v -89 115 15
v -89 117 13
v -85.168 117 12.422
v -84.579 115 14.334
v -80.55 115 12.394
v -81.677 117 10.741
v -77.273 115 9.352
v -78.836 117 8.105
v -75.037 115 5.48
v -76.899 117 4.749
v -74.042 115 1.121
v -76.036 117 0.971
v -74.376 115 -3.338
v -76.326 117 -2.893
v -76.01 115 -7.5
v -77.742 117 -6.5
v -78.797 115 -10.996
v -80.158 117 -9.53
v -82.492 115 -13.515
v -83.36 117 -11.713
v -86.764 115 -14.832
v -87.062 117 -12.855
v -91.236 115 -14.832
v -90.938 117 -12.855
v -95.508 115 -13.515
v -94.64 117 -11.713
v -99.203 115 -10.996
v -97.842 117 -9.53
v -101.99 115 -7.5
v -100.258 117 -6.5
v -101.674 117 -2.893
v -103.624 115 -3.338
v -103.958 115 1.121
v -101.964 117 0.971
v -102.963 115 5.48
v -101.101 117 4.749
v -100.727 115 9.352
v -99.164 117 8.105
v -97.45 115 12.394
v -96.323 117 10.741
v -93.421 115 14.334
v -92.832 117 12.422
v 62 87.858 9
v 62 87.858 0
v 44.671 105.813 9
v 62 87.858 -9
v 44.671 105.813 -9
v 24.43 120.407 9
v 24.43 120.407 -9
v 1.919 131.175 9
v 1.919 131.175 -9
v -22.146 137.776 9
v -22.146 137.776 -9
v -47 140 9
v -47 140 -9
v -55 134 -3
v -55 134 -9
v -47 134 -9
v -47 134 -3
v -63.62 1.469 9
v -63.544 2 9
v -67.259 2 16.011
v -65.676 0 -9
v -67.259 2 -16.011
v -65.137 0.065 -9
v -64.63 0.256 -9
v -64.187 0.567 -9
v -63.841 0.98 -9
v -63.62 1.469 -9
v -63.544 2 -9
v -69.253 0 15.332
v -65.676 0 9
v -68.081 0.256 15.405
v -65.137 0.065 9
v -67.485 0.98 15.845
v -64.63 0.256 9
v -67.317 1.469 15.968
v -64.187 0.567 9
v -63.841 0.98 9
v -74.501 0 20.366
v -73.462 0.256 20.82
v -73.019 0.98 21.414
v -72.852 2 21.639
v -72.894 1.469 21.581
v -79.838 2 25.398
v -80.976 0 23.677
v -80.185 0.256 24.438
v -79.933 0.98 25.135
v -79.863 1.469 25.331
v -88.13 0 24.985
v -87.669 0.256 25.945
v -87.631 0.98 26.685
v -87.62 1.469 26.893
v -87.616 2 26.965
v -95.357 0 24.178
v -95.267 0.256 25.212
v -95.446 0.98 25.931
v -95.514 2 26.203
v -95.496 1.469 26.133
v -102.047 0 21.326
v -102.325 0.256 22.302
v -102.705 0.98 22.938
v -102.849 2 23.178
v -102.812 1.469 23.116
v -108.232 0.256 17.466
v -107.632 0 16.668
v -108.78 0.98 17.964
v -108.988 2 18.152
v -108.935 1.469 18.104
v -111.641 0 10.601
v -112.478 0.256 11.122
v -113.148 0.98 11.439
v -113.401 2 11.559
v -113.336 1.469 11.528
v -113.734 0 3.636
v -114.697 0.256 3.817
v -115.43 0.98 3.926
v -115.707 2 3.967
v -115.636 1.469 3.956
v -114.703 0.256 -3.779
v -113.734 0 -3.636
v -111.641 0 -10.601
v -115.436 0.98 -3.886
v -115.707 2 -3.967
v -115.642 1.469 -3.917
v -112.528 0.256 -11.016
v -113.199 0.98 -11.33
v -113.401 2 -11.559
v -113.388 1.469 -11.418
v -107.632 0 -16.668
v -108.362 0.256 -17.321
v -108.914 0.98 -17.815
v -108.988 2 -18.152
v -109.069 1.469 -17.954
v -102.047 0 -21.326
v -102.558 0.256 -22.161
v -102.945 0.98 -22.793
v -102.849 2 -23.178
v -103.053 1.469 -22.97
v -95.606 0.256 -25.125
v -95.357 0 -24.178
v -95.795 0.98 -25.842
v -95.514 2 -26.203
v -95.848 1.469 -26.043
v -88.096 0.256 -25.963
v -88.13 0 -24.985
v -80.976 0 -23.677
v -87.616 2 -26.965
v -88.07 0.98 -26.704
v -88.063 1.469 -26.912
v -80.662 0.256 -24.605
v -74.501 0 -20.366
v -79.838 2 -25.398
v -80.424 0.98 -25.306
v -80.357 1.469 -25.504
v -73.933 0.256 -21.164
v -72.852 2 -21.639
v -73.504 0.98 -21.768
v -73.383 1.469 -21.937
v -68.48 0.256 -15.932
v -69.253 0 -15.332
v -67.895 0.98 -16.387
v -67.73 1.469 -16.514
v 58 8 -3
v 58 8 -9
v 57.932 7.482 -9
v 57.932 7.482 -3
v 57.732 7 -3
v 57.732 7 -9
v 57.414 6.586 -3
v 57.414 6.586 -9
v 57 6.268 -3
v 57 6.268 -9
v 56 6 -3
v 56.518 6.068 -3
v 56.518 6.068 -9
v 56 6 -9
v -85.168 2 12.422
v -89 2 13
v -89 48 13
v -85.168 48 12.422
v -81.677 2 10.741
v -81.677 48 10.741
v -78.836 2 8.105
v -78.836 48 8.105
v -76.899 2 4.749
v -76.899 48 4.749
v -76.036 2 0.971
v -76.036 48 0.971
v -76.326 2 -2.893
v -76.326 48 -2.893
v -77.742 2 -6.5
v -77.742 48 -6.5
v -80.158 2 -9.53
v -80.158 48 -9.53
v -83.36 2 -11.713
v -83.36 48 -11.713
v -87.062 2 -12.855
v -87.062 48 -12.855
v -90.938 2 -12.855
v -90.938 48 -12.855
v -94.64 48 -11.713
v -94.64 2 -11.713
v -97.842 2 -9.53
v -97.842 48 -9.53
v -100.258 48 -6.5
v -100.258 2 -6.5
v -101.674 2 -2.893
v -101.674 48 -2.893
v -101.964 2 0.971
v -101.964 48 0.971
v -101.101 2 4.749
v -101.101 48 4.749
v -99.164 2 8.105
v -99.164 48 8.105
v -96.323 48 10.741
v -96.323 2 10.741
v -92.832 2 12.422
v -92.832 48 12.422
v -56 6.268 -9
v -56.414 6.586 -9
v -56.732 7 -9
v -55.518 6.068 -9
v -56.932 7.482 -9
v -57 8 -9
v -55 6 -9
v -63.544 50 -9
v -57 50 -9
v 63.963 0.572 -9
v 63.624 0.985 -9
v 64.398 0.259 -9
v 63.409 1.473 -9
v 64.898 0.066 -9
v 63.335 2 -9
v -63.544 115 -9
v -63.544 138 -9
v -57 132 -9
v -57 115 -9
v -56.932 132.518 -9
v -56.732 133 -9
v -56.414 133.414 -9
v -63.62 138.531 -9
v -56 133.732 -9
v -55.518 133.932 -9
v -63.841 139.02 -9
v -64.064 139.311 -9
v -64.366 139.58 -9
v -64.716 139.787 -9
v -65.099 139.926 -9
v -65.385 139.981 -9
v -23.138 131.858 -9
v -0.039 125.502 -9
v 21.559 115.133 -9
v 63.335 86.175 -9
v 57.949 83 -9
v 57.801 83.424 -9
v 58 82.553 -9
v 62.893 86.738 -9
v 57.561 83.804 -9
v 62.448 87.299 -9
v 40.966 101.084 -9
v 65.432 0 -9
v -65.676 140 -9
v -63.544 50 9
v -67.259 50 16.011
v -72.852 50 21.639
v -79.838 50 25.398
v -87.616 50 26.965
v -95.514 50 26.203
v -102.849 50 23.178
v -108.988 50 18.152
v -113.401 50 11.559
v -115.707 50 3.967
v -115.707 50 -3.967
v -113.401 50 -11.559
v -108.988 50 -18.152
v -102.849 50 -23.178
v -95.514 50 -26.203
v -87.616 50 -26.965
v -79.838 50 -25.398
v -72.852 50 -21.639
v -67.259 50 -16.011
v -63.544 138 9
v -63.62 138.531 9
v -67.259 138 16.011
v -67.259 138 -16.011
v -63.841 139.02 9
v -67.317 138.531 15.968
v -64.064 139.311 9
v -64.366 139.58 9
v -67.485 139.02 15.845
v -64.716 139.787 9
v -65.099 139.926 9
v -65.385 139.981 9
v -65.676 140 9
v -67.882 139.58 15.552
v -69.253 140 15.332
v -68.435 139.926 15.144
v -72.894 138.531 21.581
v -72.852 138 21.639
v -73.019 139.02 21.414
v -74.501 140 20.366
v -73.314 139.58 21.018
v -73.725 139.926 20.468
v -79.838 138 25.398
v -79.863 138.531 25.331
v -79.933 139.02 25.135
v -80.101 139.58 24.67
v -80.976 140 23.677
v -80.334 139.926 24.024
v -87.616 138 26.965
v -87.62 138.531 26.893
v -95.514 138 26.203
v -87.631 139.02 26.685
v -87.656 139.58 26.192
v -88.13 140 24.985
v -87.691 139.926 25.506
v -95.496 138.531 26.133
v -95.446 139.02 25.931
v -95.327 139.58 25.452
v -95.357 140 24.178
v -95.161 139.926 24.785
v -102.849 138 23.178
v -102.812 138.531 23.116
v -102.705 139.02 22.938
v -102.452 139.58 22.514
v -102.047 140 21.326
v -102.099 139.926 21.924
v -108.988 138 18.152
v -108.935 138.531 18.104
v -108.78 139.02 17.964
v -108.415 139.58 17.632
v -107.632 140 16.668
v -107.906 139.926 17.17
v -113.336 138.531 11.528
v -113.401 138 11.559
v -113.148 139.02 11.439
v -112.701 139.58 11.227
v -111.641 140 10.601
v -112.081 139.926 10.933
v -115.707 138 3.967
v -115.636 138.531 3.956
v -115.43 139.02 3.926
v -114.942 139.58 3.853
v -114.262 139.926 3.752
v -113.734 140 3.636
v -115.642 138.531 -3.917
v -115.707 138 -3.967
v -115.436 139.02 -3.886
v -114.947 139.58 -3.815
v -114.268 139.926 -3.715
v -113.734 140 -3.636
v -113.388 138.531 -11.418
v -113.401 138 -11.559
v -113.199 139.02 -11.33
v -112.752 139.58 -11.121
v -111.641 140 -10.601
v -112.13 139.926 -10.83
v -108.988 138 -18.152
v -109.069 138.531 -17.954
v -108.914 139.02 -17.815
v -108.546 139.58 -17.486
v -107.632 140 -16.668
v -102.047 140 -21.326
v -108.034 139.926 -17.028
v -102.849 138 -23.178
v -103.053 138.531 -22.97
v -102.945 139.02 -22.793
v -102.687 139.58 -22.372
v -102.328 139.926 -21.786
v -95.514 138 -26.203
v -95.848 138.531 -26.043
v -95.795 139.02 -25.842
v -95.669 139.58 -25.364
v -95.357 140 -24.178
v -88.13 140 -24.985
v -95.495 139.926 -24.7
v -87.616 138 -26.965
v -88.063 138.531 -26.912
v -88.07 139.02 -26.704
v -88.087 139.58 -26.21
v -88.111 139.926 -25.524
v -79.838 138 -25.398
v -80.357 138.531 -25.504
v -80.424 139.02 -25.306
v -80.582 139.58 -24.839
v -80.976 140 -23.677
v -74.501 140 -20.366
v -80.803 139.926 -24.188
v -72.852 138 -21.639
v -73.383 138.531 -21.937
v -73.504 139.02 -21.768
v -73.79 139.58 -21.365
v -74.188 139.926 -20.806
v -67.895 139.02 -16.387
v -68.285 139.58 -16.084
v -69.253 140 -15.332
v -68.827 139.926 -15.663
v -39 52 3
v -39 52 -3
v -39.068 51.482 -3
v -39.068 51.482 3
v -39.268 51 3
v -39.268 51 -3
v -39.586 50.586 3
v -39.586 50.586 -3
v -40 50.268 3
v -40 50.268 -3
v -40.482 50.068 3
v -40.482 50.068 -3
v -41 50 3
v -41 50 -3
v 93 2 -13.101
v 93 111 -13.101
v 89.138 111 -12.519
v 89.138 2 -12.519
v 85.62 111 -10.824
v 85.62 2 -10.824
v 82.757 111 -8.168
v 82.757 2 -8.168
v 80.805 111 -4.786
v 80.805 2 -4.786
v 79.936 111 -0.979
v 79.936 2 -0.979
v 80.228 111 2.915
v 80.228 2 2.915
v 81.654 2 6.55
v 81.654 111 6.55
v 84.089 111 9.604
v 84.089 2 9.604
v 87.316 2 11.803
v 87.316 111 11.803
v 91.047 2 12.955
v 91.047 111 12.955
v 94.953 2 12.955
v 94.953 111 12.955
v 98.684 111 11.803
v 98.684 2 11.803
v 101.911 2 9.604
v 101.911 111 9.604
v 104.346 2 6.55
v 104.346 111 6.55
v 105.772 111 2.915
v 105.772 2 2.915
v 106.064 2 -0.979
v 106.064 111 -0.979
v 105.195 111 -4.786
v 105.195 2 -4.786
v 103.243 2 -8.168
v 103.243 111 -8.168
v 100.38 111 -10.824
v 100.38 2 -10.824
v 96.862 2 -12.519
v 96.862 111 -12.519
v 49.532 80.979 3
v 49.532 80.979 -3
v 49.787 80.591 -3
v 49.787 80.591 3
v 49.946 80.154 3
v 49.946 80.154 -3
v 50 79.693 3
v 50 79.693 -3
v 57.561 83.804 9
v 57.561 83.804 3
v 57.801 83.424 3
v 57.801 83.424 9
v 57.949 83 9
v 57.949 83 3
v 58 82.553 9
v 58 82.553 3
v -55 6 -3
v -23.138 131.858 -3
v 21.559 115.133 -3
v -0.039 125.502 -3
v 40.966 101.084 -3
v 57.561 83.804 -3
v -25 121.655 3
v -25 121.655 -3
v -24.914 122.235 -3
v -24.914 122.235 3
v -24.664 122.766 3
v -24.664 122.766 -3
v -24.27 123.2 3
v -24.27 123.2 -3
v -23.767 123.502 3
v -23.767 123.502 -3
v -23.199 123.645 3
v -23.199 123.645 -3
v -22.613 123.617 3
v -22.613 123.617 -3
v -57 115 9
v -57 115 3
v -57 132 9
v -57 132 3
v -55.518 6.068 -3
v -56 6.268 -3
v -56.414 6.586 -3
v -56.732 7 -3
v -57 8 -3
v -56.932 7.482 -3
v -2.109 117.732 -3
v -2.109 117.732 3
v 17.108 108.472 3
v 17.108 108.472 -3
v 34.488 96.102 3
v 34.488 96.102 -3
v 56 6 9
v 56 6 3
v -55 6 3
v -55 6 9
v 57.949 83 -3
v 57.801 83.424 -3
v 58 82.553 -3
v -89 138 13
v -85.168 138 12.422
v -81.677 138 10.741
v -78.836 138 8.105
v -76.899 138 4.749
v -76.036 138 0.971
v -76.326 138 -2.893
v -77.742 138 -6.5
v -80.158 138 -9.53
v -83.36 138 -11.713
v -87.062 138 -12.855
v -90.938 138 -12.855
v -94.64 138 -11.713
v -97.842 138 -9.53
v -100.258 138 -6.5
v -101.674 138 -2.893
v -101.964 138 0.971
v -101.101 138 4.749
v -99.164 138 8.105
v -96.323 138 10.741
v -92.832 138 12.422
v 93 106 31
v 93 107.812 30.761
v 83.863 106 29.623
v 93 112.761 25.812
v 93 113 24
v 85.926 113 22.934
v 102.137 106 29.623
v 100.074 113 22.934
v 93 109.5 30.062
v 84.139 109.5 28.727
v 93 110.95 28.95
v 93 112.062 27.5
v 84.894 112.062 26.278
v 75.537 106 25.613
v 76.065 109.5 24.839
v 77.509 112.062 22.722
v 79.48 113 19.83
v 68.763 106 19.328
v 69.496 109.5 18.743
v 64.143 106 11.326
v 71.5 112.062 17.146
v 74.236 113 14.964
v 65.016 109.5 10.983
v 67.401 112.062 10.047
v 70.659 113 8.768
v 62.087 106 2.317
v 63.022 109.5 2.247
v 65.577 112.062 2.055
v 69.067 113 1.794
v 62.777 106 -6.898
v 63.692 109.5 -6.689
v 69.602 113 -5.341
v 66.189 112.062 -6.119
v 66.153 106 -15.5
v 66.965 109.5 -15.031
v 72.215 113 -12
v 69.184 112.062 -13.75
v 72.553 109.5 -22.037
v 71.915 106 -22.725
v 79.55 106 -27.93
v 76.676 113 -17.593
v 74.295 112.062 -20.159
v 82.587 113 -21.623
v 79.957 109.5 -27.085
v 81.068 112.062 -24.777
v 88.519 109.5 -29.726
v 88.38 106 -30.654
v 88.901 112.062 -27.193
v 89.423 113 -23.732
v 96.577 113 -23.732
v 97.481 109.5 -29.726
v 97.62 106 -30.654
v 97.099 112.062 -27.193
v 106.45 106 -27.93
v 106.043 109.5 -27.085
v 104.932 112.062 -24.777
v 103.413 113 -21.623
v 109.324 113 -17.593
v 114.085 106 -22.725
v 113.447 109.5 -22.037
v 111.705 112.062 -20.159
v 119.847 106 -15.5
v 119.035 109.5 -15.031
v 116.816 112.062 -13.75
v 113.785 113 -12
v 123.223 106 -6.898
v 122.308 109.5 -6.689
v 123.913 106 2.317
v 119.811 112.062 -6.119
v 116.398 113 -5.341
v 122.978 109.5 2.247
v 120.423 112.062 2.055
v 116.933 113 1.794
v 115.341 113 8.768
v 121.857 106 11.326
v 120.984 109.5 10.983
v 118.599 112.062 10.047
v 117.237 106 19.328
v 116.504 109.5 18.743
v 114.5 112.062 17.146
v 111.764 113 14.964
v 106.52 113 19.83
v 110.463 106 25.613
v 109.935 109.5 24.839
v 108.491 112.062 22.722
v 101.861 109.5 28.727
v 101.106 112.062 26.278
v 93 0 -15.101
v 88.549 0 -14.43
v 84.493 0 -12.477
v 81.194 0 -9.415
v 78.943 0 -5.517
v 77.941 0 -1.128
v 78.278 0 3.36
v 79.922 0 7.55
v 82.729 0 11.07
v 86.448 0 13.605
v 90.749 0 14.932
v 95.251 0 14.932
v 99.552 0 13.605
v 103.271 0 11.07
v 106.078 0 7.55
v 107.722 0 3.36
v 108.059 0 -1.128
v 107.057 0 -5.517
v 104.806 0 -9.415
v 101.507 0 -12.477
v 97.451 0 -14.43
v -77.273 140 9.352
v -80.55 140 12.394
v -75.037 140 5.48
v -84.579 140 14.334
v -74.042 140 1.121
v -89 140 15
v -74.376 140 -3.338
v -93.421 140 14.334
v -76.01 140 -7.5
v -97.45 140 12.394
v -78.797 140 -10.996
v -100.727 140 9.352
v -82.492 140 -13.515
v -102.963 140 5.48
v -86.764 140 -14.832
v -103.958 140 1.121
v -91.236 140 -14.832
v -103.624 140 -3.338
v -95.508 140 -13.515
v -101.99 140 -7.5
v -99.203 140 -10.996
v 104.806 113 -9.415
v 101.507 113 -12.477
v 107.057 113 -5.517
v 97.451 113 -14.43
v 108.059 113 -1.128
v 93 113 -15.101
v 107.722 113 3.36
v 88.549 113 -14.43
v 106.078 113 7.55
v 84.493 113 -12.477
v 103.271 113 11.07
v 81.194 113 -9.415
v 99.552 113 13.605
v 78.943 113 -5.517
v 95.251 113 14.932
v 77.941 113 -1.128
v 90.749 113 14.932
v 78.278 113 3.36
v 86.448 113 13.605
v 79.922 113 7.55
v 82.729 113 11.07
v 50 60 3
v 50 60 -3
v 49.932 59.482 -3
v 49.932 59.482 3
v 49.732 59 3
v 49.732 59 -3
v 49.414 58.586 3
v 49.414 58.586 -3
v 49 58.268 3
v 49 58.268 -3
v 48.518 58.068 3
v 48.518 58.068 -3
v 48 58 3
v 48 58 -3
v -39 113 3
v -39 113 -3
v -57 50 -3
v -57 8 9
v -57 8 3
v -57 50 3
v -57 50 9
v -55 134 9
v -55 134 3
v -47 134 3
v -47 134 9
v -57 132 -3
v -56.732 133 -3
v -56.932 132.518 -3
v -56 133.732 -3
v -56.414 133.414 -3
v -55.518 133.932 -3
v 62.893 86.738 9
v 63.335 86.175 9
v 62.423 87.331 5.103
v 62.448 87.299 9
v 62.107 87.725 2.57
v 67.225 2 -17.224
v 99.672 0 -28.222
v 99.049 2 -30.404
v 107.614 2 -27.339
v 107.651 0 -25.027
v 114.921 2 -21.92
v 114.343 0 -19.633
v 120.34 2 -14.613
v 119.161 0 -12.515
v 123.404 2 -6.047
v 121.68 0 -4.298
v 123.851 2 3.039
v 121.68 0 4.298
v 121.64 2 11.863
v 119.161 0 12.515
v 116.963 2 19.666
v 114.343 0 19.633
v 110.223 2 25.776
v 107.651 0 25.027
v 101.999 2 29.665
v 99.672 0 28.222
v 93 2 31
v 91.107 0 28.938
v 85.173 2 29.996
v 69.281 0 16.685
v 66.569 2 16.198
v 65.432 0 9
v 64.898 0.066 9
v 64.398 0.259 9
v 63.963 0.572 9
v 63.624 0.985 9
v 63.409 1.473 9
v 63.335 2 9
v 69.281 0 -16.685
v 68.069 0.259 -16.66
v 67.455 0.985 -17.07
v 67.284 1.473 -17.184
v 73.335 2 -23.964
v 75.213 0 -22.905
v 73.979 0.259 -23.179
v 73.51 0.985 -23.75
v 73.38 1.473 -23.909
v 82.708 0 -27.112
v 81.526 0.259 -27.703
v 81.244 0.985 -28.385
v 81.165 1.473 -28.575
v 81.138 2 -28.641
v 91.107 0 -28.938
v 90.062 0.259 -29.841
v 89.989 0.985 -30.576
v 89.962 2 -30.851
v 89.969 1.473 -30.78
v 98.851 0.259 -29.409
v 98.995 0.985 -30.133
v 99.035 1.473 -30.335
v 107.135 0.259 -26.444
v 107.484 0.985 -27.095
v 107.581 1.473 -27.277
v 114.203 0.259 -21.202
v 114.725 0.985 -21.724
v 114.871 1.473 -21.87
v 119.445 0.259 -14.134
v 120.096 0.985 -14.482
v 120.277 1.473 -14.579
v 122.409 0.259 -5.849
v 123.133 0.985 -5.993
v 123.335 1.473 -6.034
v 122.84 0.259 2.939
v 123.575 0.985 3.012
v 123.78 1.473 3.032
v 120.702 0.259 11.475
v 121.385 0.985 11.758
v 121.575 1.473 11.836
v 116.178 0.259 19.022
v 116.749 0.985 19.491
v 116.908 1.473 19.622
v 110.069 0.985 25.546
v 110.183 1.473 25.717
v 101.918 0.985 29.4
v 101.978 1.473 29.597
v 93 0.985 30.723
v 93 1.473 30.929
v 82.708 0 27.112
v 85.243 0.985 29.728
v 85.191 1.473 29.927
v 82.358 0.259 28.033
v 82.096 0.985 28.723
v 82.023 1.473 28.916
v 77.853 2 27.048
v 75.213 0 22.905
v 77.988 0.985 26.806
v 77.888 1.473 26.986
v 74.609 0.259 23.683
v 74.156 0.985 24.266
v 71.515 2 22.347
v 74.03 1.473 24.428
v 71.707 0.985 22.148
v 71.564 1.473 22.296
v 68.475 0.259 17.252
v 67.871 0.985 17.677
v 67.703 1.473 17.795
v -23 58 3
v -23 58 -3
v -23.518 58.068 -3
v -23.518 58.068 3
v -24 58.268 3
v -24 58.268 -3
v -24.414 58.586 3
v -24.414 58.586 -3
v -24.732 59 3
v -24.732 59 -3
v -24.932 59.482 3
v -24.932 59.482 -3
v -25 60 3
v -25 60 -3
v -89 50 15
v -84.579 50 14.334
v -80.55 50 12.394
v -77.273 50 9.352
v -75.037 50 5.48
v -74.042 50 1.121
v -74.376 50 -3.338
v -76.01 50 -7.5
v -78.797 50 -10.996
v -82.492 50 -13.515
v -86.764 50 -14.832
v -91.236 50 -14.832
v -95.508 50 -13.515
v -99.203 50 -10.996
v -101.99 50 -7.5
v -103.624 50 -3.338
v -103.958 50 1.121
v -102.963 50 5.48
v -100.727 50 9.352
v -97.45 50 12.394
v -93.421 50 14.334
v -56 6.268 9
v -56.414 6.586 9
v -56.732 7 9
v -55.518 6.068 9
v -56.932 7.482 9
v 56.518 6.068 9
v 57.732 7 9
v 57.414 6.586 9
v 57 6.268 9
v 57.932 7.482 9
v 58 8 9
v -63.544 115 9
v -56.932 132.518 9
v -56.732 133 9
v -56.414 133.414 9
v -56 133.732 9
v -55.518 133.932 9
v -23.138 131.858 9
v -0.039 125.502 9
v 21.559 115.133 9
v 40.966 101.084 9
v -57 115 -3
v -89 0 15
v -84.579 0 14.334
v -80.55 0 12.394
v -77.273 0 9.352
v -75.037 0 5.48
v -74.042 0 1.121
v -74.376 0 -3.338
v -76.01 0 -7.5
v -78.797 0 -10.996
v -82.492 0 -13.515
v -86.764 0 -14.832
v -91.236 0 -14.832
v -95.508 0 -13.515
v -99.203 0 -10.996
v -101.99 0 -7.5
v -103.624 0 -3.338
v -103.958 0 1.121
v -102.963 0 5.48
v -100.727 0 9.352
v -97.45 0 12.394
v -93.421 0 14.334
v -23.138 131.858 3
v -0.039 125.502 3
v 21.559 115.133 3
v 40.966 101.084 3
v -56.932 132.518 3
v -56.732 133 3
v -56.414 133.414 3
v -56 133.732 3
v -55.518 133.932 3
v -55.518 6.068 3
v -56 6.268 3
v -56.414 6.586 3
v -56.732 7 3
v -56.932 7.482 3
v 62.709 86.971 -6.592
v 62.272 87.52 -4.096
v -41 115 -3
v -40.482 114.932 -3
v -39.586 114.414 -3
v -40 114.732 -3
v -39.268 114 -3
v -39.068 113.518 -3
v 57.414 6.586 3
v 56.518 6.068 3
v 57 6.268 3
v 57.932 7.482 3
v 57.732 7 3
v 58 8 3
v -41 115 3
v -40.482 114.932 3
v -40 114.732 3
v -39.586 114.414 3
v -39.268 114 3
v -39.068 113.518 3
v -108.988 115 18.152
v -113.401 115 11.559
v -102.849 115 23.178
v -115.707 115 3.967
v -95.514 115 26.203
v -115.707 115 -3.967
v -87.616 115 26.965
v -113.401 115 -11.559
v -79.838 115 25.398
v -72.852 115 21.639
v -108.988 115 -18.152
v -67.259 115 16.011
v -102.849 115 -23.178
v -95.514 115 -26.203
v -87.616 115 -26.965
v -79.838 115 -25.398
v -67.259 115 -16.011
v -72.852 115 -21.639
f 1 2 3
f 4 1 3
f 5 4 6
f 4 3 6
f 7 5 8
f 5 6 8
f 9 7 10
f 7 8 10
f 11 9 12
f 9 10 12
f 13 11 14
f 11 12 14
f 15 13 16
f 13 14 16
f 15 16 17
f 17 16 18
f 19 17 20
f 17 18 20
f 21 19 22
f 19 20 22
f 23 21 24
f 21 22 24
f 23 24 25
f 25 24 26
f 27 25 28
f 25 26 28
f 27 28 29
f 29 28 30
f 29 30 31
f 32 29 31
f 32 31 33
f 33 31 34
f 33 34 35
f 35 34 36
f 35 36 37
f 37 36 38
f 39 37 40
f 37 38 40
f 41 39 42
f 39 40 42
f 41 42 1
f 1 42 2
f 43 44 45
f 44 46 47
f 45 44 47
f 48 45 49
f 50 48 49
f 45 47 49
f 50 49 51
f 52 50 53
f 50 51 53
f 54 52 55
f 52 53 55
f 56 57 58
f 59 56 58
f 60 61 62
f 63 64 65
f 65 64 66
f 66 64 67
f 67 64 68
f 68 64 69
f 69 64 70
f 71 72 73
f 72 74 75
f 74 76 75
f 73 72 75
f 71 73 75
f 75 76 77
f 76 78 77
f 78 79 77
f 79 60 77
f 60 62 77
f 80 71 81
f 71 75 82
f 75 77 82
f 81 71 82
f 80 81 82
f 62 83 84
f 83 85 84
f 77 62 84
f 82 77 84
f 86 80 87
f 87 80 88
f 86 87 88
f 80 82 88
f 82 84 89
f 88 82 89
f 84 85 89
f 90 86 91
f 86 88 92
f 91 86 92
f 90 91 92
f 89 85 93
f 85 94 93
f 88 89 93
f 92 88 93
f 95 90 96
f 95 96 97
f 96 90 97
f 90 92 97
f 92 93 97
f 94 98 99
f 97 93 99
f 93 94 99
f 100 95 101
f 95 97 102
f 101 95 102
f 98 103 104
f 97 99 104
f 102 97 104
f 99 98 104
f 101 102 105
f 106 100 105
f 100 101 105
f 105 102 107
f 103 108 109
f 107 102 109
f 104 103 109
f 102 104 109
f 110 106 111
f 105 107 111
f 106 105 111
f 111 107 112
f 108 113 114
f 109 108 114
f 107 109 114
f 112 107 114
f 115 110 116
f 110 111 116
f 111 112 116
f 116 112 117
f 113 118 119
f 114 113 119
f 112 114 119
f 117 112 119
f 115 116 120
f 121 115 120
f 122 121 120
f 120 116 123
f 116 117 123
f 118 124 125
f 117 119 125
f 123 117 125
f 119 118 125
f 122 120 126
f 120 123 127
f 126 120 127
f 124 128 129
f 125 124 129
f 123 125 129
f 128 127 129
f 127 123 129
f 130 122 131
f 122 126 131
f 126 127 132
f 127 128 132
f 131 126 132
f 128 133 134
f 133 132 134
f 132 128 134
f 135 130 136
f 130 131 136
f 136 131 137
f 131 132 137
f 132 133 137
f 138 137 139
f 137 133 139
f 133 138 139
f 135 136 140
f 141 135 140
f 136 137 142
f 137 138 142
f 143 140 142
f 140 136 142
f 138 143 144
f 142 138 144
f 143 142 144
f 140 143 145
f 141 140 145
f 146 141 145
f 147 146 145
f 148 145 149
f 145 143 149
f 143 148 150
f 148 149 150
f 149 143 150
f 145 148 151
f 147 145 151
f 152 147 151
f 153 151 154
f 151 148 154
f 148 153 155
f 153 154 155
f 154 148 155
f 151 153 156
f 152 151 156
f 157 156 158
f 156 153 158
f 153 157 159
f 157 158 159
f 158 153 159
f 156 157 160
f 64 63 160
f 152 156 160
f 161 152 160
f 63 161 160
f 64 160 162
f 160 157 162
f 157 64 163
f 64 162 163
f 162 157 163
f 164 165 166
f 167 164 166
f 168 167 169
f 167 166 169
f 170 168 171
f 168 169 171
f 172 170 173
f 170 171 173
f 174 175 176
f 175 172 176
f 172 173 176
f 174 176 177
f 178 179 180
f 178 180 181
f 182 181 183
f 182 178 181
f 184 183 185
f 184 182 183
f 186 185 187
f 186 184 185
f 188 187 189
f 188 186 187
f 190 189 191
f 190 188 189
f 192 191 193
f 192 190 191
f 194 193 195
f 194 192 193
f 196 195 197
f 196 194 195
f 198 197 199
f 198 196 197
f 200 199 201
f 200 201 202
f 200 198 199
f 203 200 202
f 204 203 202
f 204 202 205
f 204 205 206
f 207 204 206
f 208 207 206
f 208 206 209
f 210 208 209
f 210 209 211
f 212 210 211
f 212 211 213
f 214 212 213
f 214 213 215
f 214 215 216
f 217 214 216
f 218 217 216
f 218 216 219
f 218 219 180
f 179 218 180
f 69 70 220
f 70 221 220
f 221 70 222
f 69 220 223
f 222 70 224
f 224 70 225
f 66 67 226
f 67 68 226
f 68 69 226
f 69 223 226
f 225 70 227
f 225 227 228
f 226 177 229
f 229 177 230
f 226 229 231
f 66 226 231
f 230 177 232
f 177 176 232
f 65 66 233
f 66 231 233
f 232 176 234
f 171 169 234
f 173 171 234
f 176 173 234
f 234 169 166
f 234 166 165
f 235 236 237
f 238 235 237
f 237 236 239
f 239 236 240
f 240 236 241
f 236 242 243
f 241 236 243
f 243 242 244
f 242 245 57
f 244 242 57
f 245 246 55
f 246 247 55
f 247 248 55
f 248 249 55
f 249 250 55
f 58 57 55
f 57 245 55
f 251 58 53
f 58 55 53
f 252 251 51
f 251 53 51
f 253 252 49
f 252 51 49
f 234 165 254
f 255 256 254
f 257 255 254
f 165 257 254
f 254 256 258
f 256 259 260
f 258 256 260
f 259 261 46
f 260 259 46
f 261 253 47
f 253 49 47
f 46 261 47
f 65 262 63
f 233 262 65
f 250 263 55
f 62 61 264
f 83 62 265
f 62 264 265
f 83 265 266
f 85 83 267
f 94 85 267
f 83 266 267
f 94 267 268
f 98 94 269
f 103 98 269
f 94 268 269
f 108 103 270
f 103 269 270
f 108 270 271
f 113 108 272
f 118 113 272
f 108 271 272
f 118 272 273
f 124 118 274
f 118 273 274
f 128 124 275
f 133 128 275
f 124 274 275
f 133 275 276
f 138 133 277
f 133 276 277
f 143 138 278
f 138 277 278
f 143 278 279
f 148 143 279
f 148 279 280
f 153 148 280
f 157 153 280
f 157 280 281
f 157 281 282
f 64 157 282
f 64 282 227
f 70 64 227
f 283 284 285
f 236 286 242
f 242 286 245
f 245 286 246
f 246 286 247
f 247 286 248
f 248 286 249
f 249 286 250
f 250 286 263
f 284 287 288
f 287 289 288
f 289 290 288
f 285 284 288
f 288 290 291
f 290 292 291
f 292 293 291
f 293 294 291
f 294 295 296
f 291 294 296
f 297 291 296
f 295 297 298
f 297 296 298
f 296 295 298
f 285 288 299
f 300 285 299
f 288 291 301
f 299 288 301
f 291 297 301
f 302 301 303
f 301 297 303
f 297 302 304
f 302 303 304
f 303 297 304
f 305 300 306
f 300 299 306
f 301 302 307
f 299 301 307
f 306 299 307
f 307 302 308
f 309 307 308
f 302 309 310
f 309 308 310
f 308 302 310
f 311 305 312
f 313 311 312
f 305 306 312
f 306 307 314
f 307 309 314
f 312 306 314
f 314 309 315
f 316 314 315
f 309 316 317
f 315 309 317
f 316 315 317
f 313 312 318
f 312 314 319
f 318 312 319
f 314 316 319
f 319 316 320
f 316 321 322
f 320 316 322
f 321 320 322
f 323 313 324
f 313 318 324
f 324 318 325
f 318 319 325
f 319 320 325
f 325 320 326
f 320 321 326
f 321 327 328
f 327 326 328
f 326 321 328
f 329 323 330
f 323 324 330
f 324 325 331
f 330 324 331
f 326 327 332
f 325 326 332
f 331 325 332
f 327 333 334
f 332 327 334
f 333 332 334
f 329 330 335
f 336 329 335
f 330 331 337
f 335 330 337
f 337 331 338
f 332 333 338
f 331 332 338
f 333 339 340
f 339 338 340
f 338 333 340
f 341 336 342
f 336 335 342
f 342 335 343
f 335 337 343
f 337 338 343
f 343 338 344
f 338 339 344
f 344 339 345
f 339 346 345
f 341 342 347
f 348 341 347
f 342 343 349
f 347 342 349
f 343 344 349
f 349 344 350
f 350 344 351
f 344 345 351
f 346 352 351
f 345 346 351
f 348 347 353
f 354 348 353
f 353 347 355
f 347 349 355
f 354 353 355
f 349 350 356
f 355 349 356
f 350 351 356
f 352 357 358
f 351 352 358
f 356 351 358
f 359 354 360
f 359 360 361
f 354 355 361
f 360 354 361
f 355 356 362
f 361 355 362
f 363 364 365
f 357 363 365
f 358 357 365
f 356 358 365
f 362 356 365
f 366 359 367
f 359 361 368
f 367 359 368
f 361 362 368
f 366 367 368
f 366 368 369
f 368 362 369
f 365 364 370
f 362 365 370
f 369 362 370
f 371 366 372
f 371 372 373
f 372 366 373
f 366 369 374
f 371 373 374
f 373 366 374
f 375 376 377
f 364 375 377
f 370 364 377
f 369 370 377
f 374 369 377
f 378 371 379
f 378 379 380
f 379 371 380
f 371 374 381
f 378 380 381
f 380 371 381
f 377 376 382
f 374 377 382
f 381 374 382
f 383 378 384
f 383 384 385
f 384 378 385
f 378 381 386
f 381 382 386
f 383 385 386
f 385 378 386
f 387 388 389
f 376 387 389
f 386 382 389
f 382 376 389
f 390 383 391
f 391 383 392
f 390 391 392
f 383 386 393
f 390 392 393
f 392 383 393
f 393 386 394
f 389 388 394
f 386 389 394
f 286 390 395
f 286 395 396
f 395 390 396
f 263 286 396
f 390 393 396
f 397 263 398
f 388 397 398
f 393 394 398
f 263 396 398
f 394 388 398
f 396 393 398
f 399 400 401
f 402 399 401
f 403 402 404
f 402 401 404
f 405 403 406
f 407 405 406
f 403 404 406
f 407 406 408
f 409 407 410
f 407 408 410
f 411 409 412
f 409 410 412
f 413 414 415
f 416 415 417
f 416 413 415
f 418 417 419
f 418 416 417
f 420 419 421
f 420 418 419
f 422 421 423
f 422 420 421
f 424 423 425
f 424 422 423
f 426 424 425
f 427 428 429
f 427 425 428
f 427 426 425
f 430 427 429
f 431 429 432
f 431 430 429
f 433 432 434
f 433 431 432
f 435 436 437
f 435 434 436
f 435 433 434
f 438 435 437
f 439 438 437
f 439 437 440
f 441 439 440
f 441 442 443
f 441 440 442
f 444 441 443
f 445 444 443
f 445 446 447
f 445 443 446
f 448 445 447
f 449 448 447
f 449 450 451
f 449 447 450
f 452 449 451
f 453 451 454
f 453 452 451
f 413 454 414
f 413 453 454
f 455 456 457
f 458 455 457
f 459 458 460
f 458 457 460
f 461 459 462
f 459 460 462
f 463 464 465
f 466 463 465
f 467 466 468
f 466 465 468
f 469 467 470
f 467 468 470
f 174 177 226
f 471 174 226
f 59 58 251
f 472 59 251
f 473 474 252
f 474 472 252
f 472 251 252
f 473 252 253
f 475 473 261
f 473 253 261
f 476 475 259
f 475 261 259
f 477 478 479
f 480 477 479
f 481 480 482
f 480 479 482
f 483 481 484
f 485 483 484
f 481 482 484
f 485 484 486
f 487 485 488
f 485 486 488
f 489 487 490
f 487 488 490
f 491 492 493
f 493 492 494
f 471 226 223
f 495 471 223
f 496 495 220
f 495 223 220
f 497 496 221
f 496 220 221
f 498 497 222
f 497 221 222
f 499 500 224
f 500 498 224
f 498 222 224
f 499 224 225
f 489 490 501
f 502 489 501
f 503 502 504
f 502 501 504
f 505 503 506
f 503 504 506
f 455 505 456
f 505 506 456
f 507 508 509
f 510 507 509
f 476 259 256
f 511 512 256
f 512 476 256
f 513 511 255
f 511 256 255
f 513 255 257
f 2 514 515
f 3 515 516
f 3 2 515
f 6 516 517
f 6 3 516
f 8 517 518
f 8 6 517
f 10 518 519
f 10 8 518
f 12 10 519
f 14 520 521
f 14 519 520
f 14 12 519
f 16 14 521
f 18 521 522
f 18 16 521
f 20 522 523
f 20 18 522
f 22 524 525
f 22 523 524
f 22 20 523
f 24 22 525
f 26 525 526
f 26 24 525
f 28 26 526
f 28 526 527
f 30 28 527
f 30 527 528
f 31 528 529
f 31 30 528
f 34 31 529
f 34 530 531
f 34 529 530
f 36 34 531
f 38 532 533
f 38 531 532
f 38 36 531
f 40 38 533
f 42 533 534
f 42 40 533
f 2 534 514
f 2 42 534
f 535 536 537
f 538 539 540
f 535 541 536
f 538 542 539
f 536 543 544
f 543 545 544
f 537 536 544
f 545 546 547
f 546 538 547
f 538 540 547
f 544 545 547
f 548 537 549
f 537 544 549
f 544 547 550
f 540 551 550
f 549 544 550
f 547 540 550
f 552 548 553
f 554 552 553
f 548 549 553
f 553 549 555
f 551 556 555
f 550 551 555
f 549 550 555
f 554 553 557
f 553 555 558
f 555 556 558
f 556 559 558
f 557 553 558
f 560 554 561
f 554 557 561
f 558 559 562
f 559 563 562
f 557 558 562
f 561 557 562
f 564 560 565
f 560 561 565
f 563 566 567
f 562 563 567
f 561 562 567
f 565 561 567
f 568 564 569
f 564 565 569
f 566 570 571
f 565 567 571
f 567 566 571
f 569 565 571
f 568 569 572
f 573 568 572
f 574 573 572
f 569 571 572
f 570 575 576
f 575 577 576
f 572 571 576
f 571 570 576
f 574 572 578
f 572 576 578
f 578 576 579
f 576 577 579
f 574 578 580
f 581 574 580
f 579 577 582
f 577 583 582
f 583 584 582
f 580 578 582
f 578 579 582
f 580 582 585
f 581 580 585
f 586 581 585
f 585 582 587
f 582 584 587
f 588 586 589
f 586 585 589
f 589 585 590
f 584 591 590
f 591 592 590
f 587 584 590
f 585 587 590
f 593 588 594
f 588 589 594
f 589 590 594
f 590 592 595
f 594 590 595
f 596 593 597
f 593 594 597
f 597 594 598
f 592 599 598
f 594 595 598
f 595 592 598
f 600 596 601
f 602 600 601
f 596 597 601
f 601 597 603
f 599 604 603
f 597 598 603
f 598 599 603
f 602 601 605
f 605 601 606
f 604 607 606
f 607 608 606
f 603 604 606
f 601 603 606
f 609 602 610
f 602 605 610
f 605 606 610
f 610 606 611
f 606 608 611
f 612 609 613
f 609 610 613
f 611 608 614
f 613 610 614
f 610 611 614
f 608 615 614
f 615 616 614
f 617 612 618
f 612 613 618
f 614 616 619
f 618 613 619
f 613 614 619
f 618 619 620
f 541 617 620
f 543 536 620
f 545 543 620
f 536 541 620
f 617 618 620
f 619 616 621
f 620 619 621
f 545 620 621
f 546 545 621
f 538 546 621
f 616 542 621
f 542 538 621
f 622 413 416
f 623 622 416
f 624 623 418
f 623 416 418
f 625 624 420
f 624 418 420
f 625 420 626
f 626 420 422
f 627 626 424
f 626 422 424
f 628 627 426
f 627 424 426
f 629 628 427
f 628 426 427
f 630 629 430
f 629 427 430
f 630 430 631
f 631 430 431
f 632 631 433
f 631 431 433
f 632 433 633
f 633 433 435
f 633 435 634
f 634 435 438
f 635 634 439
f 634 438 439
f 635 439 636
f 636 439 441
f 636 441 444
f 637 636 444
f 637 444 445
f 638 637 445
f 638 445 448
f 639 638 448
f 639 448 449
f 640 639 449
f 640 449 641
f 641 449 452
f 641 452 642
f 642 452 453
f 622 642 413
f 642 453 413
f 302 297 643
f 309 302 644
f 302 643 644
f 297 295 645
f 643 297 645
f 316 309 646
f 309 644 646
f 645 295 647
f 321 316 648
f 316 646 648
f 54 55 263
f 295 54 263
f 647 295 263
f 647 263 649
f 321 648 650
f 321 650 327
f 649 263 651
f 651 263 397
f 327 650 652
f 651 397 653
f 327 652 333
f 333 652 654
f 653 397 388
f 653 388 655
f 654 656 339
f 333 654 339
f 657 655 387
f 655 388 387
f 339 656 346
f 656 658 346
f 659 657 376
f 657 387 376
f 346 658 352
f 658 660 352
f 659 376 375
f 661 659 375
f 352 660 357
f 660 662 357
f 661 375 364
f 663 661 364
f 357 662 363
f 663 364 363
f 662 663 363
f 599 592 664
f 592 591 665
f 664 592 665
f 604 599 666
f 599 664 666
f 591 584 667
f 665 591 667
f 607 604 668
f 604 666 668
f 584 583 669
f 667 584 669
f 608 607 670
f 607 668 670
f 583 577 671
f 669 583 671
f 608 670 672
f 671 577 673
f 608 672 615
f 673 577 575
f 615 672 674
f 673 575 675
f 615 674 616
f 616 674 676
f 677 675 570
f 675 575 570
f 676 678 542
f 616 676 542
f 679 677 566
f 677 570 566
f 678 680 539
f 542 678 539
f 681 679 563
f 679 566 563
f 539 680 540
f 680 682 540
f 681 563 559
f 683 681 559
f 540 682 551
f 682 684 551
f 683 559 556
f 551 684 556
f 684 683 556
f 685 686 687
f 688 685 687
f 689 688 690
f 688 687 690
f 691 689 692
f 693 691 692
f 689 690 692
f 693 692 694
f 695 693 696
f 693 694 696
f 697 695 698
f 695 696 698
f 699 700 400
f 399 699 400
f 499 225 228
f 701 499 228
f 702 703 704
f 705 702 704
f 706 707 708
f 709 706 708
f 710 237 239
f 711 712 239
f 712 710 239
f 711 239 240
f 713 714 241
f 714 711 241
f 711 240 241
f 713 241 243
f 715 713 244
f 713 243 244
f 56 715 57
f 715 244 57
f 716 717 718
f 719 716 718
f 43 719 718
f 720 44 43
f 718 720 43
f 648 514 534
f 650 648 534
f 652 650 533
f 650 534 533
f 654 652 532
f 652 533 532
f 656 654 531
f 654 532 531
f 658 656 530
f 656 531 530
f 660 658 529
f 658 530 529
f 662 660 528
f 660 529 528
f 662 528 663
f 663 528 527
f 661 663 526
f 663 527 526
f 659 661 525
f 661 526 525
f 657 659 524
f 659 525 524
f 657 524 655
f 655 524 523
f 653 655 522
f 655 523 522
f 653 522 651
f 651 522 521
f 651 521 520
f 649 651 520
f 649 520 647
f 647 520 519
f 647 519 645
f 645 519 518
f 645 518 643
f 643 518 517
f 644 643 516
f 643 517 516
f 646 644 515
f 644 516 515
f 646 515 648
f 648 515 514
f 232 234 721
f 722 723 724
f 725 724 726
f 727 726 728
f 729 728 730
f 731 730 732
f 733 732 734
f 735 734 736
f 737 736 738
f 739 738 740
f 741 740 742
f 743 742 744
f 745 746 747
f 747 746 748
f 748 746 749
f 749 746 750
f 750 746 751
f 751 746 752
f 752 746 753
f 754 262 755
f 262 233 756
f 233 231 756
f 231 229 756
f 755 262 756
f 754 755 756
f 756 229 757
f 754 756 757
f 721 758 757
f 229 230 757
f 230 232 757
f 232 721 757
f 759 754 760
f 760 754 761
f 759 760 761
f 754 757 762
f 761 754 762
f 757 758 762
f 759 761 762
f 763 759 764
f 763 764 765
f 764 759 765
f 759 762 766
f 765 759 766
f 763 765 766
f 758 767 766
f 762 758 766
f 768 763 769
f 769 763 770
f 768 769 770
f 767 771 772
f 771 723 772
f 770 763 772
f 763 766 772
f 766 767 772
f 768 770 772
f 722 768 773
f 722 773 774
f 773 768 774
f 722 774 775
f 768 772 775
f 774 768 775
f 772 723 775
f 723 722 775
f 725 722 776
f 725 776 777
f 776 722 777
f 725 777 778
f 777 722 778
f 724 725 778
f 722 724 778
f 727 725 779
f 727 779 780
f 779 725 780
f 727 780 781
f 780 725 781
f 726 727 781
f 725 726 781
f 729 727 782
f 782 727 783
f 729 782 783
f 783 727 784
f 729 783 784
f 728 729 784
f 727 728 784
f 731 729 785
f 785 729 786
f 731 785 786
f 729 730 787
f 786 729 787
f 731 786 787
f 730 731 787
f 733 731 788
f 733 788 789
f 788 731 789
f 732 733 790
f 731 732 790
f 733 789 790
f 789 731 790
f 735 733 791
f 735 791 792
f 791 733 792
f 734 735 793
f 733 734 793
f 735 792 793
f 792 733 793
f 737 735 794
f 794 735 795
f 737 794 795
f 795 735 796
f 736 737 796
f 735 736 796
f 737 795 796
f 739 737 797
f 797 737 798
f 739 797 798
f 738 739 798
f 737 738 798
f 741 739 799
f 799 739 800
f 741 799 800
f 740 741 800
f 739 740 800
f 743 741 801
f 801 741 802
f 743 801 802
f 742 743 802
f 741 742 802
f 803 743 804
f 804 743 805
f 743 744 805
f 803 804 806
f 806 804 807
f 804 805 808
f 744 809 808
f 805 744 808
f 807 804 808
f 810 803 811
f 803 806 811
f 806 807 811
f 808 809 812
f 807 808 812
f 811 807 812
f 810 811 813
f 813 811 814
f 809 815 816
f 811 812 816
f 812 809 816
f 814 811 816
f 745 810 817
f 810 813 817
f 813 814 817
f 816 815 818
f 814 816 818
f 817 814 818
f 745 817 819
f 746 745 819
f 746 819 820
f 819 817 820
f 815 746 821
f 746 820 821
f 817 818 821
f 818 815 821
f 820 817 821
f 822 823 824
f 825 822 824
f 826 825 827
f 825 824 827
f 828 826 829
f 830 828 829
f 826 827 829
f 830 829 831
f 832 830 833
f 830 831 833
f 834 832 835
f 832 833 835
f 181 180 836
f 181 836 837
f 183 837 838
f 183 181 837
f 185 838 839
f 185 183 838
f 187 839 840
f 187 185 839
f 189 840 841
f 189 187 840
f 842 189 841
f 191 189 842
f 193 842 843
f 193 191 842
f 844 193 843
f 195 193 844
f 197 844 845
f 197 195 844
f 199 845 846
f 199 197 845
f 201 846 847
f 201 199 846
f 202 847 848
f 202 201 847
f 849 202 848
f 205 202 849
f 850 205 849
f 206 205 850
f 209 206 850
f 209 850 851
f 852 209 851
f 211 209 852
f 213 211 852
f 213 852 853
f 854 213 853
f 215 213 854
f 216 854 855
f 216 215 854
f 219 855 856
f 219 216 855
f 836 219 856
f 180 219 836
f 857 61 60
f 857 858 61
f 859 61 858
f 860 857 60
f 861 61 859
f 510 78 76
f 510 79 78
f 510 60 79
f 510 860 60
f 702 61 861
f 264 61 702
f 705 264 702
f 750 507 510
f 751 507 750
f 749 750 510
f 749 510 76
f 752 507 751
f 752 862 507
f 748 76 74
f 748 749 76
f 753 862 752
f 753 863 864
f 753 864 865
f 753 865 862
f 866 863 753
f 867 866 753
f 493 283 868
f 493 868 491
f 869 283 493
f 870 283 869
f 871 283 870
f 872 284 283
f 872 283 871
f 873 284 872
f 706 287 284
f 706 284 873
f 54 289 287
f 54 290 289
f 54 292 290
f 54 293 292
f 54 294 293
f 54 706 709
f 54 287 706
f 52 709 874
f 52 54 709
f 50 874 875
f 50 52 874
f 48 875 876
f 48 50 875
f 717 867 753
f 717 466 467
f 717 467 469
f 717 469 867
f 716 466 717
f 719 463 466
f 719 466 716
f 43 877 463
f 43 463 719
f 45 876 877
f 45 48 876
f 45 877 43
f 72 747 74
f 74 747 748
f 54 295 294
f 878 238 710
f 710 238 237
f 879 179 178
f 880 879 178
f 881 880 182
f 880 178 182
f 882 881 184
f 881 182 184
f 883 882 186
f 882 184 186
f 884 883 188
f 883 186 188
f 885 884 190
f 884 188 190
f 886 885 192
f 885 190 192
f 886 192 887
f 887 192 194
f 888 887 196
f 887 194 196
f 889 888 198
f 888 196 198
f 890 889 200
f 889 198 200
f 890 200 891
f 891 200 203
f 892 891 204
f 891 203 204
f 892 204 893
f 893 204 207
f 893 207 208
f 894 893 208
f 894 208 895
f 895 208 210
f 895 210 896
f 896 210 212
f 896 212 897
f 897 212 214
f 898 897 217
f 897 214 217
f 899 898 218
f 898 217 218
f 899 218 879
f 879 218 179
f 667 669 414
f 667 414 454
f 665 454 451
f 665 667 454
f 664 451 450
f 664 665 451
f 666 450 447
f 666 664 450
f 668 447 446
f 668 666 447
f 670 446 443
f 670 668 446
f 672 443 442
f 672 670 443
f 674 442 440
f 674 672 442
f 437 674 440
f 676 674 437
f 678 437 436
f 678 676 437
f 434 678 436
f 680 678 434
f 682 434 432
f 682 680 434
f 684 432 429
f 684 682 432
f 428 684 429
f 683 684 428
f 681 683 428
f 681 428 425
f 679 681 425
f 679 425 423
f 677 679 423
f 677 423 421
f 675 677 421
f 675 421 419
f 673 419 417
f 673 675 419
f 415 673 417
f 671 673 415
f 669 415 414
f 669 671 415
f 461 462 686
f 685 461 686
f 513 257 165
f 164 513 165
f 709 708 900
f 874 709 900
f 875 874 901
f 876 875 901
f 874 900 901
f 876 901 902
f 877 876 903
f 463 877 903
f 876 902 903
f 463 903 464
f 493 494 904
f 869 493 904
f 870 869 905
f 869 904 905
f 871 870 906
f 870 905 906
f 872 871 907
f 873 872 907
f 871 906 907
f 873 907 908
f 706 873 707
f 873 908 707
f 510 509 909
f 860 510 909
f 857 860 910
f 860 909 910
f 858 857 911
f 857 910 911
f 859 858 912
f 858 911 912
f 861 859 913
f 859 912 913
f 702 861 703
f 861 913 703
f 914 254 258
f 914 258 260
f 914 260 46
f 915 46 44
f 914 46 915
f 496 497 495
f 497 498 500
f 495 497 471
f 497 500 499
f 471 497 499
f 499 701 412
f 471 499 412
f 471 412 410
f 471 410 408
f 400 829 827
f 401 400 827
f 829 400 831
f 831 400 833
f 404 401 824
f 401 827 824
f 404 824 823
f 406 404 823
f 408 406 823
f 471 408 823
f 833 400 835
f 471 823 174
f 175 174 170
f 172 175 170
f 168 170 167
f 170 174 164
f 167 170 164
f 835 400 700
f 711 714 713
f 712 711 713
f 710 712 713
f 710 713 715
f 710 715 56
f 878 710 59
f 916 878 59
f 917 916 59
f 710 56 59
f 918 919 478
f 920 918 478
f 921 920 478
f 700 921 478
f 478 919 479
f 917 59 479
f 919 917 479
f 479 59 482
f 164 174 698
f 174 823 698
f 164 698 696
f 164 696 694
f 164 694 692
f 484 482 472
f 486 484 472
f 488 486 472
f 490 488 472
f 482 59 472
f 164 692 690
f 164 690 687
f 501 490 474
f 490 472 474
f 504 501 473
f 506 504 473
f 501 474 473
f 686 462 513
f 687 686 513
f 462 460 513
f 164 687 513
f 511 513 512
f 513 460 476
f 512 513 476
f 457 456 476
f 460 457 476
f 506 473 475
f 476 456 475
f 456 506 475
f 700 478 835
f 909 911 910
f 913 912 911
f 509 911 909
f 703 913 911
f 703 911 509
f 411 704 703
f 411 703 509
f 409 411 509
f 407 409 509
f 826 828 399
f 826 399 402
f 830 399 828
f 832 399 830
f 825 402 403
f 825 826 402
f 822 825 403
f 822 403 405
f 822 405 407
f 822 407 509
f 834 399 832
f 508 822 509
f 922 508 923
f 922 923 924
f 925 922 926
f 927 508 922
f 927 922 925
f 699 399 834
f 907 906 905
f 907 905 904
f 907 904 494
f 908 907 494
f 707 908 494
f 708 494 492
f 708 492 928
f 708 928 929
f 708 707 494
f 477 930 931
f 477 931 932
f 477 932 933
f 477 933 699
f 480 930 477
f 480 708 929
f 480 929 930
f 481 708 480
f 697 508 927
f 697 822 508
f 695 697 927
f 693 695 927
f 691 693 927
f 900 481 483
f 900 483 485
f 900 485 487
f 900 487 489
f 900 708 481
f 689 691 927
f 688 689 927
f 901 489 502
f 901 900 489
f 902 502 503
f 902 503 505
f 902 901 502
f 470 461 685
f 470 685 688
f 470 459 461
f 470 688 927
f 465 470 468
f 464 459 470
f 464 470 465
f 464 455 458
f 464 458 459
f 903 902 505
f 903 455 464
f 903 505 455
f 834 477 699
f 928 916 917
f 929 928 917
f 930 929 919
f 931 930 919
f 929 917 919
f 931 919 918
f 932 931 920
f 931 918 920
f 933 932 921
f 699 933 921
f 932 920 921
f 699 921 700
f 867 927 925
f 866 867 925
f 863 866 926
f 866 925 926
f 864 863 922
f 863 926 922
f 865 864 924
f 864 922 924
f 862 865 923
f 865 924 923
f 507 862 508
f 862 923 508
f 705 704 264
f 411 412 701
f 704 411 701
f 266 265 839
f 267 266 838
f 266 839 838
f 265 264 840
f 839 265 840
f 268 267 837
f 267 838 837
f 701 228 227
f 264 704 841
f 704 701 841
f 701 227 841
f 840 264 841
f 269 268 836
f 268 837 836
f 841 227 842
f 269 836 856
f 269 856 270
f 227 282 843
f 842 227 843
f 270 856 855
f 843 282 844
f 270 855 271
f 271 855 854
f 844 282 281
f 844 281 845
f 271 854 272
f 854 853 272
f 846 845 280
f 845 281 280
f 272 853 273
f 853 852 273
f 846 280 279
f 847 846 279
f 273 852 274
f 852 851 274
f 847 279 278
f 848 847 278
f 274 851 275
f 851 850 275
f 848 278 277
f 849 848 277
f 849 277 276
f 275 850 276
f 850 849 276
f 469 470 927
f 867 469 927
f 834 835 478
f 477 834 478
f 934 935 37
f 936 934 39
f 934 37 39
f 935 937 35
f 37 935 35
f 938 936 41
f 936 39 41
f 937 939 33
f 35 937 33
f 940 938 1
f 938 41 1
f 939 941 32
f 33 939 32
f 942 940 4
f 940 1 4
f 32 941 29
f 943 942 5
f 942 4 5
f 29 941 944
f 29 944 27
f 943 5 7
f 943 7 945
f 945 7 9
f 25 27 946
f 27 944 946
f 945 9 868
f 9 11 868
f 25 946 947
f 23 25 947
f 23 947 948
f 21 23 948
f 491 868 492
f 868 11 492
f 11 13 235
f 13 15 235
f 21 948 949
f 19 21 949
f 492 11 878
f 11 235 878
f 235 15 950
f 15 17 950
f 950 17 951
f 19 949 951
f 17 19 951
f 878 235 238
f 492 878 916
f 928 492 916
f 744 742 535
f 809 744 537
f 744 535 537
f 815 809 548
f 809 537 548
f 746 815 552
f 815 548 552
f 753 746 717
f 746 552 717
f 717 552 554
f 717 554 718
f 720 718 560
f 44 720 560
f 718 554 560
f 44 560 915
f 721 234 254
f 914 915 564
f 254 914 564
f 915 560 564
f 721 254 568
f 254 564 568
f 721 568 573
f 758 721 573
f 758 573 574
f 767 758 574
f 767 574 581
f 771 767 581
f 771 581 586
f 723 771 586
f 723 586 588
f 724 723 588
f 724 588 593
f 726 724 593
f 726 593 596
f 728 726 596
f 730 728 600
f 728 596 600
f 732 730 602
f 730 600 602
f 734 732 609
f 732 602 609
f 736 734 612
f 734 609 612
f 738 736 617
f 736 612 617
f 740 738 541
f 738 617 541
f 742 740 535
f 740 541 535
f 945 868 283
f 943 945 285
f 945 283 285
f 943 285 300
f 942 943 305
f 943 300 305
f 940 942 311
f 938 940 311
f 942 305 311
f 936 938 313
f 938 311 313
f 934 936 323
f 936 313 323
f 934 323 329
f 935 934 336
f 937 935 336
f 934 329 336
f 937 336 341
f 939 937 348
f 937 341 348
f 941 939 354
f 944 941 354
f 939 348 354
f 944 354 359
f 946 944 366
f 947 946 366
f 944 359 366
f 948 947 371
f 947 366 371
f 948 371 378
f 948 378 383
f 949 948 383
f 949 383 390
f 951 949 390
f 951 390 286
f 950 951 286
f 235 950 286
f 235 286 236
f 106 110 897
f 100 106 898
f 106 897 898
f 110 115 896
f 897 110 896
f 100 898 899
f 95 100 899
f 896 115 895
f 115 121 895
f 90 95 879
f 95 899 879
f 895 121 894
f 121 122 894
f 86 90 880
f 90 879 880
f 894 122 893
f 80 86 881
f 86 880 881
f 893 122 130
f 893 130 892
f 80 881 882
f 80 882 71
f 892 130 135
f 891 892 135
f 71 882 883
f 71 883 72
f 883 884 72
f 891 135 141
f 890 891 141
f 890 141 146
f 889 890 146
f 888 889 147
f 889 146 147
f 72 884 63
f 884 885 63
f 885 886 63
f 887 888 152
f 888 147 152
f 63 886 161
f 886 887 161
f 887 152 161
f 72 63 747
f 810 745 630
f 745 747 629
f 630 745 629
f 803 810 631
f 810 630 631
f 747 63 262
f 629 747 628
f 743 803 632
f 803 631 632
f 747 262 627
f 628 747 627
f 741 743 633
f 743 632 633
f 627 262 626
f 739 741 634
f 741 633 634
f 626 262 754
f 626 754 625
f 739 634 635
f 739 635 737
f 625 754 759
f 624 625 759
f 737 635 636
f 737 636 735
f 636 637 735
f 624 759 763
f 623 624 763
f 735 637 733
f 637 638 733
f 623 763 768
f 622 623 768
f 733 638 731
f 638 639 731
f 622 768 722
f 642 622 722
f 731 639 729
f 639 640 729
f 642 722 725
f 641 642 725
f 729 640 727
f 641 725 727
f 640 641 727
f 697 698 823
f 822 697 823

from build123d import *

# Parameters (mm, degrees)
CUT_EXTRUDE_8_DEPTH      = 184.806963974
EXTRUDE_1_DEPTH          = 9
EXTRUDE_1_DEPTH_BACK     = 9
EXTRUDE_2_DEPTH          = 3
EXTRUDE_2_DEPTH_BACK     = 3
SKETCH_2_R               = 13
SKETCH_2_R_2             = 13.100880905
CUT_EXTRUDE_7_DEPTH      = 190.570567491
CUT_EXTRUDE_9_DEPTH      = 190.570567491
CUT_EXTRUDE_9_DEPTH_BACK = 190.570567491
CHAMFER_4_SIZE           = 2
CHAMFER_5_SIZE           = 2
CHAMFER_6_SIZE           = 2


with BuildPart() as part:
    # Эскиз1 → Повернуть1 (revolve)
    with BuildSketch(Plane.XY, mode=Mode.PRIVATE) as revolve_1_sk:
        with BuildLine():
            Line((-62, 2), (-62, 138))
            ThreePointArc((-62, 138), (-62.585786438, 139.414213562), (-64, 140))
            Line((-64, 140), (-89, 140))
            Line((-89, 140), (-89, 0))
            Line((-89, 0), (-64, 0))
            ThreePointArc((-64, 0), (-62.585786438, 0.585786438), (-62, 2))
        make_face()
    revolve(revolve_1_sk.sketch.rotate(Axis((-89, 140, 0), (0, -1, 0)), 180), axis=Axis((-89, 140, 0), (0, -1, 0)))

    # Эскиз5 → Вырез-Вытянуть8 (cut, through all)
    with BuildSketch(Plane.XY):
        with BuildLine():
            Line((-116, 115), (-41, 115))
            ThreePointArc((-41, 115), (-39.585786438, 114.414213562), (-39, 113))
            Line((-39, 113), (-39, 52))
            ThreePointArc((-39, 52), (-39.585786438, 50.585786438), (-41, 50))
            Line((-41, 50), (-116, 50))
            Line((-116, 50), (-116, 115))
        make_face()
        with BuildLine():
            Line((50, 79.693161564), (50, 60))
            ThreePointArc((50, 60), (49.414213562, 58.585786438), (48, 58))
            Line((48, 58), (-23, 58))
            ThreePointArc((-23, 58), (-24.414213562, 58.585786438), (-25, 60))
            Line((-25, 60), (-25, 121.655250606))
            ThreePointArc((-25, 121.655250606), (-24.27000127, 123.200273834), (-22.612903226, 123.617432067))
            ThreePointArc((-22.612903226, 123.617432067), (17.108435299, 108.471694573), (49.532258065, 80.978535137))
            ThreePointArc((49.532258065, 80.978535137), (49.87943025, 80.377078178), (50, 79.693161564))
        make_face()
    extrude(amount=-CUT_EXTRUDE_8_DEPTH, mode=Mode.SUBTRACT)



with BuildPart() as body_2:
    # Эскиз1<4> → Повернуть2 (revolve)
    with BuildSketch(Plane.XY, mode=Mode.PRIVATE) as revolve_2_sk:
        with BuildLine():
            Line((62, 2), (62, 106))
            ThreePointArc((62, 106), (64.050252532, 110.949747468), (69, 113))
            Line((69, 113), (93, 113))
            Line((93, 113), (93, 0))
            Line((93, 0), (64, 0))
            ThreePointArc((64, 0), (62.585786438, 0.585786438), (62, 2))
        make_face()
    revolve(revolve_2_sk.sketch.rotate(Axis((93, 113, 0), (0, -1, 0)), 270), axis=Axis((93, 113, 0), (0, -1, 0)))


with BuildPart() as part_1:
    add(part.part)

    add(body_2.part)  # Бобышка-Вытянуть1 merges body 2
    # Эскиз1<5> → Бобышка-Вытянуть1 (add, two sides: drawn at the far end of the back side and taken through both)
    # profile 1 of 3: a face of its own
    with BuildSketch(Plane.XY.offset(-EXTRUDE_1_DEPTH_BACK)):
        with BuildLine():
            ThreePointArc((-62, 2), (-62.585786438, 0.585786438), (-64, 0))
            Line((-64, 0), (-47, 0))
            Line((-47, 0), (64, 0))
            ThreePointArc((64, 0), (62.585786438, 0.585786438), (62, 2))
            Line((62, 2), (62, 87.857839718))
            ThreePointArc((62, 87.857839718), (13.414826158, 126.293502526), (-47, 140))
            Line((-47, 140), (-64, 140))
            ThreePointArc((-64, 140), (-62.585786438, 139.414213562), (-62, 138))
            Line((-62, 138), (-62, 2))
        make_face()
        with BuildLine():
            Line((56, 6), (-47, 6))
            Line((-47, 6), (-55, 6))
            ThreePointArc((-55, 6), (-56.414213562, 6.585786438), (-57, 8))
            Line((-57, 8), (-57, 132))
            ThreePointArc((-57, 132), (-56.414213562, 133.414213562), (-55, 134))
            Line((-55, 134), (-47, 134))
            ThreePointArc((-47, 134), (10.992622758, 120.800892818), (57.560606061, 83.803816502))
            ThreePointArc((57.560606061, 83.803816502), (57.886956825, 83.215881236), (58, 82.55301327))
            Line((58, 82.55301327), (58, 8))
            ThreePointArc((58, 8), (57.414213562, 6.585786438), (56, 6))
        make_face(mode=Mode.SUBTRACT)
    # profile 2 of 3: a face of its own
    with BuildSketch(Plane.XY.offset(-EXTRUDE_1_DEPTH_BACK)):
        with BuildLine():
            Line((-89, 0), (-64, 0))
            ThreePointArc((-64, 0), (-62.585786438, 0.585786438), (-62, 2))
            Line((-62, 2), (-62, 138))
            ThreePointArc((-62, 138), (-62.585786438, 139.414213562), (-64, 140))
            Line((-64, 140), (-89, 140))
            Line((-89, 140), (-89, 0))
        make_face()
    # profile 3 of 3: a face of its own
    with BuildSketch(Plane.XY.offset(-EXTRUDE_1_DEPTH_BACK)):
        with BuildLine():
            ThreePointArc((62, 2), (62.585786438, 0.585786438), (64, 0))
            Line((64, 0), (93, 0))
            ThreePointArc((93, 0), (85.022725317, 46.583258795), (62, 87.857839718))
            Line((62, 87.857839718), (62, 2))
        make_face()
    extrude(amount=EXTRUDE_1_DEPTH + EXTRUDE_1_DEPTH_BACK)

    # Эскиз1<6> → Бобышка-Вытянуть2 (add, two sides: drawn at the far end of the back side and taken through both)
    with BuildSketch(Plane.XY.offset(-EXTRUDE_2_DEPTH_BACK)):
        with BuildLine():
            Line((-47, 134), (-47, 6))
            Line((-47, 6), (56, 6))
            ThreePointArc((56, 6), (57.414213562, 6.585786438), (58, 8))
            Line((58, 8), (58, 82.55301327))
            ThreePointArc((58, 82.55301327), (57.886956825, 83.215881236), (57.560606061, 83.803816502))
            ThreePointArc((57.560606061, 83.803816502), (10.992622758, 120.800892818), (-47, 134))
        make_face()
        with BuildLine():
            Line((-55, 6), (-47, 6))
            Line((-47, 6), (-47, 134))
            Line((-47, 134), (-55, 134))
            ThreePointArc((-55, 134), (-56.414213562, 133.414213562), (-57, 132))
            Line((-57, 132), (-57, 8))
            ThreePointArc((-57, 8), (-56.414213562, 6.585786438), (-55, 6))
        make_face()
    extrude(amount=EXTRUDE_2_DEPTH + EXTRUDE_2_DEPTH_BACK)

    # Эскиз2 → Вырез-Вытянуть7 (cut, through all)
    with BuildSketch(Plane(origin=(0, 0, 0), x_dir=(1, 0, 0), z_dir=(0, 1, 0))):
        with Locations(Location((-89, 0, 0), (0, 0, 270))):
            Circle(SKETCH_2_R)
        with Locations(Location((93, 0, 0), (0, 0, 90))):
            Circle(SKETCH_2_R_2)
    extrude(amount=CUT_EXTRUDE_7_DEPTH, mode=Mode.SUBTRACT)

    # Эскиз5<2> → Вырез-Вытянуть9 (cut, two sides: drawn at the far end of the back side and taken through both)
    with BuildSketch(Plane.XY.offset(-CUT_EXTRUDE_9_DEPTH_BACK)):
        with BuildLine():
            Line((-116, 115), (-41, 115))
            ThreePointArc((-41, 115), (-39.585786438, 114.414213562), (-39, 113))
            Line((-39, 113), (-39, 52))
            ThreePointArc((-39, 52), (-39.585786438, 50.585786438), (-41, 50))
            Line((-41, 50), (-116, 50))
            Line((-116, 50), (-116, 115))
        make_face()
        with BuildLine():
            Line((50, 79.693161564), (50, 60))
            ThreePointArc((50, 60), (49.414213562, 58.585786438), (48, 58))
            Line((48, 58), (-23, 58))
            ThreePointArc((-23, 58), (-24.414213562, 58.585786438), (-25, 60))
            Line((-25, 60), (-25, 121.655250606))
            ThreePointArc((-25, 121.655250606), (-24.27000127, 123.200273834), (-22.612903226, 123.617432067))
            ThreePointArc((-22.612903226, 123.617432067), (17.108435299, 108.471694573), (49.532258065, 80.978535137))
            ThreePointArc((49.532258065, 80.978535137), (49.87943025, 80.377078178), (50, 79.693161564))
        make_face()
    extrude(amount=CUT_EXTRUDE_9_DEPTH + CUT_EXTRUDE_9_DEPTH_BACK, mode=Mode.SUBTRACT)

    # Фаска4
    chamfer_4_edges = [part_1.edges().sort_by_distance(p)[0] for p in [
        (93, 0, 13.100880905),
        (93, 113, 13.100880905),
    ]]
    chamfer(chamfer_4_edges, length=CHAMFER_4_SIZE)

    # Фаска5
    chamfer_5_edges = [part_1.edges().sort_by_distance(p)[0] for p in [
        (-89, 115, -13),
        (-89, 140, -13),
    ]]
    chamfer(chamfer_5_edges, length=CHAMFER_5_SIZE)

    # Фаска6
    chamfer_6_edges = [part_1.edges().sort_by_distance(p)[0] for p in [
        (-89, 0, -13),
        (-89, 50, -13),
    ]]
    chamfer(chamfer_6_edges, length=CHAMFER_6_SIZE)


solid = part_1.part
